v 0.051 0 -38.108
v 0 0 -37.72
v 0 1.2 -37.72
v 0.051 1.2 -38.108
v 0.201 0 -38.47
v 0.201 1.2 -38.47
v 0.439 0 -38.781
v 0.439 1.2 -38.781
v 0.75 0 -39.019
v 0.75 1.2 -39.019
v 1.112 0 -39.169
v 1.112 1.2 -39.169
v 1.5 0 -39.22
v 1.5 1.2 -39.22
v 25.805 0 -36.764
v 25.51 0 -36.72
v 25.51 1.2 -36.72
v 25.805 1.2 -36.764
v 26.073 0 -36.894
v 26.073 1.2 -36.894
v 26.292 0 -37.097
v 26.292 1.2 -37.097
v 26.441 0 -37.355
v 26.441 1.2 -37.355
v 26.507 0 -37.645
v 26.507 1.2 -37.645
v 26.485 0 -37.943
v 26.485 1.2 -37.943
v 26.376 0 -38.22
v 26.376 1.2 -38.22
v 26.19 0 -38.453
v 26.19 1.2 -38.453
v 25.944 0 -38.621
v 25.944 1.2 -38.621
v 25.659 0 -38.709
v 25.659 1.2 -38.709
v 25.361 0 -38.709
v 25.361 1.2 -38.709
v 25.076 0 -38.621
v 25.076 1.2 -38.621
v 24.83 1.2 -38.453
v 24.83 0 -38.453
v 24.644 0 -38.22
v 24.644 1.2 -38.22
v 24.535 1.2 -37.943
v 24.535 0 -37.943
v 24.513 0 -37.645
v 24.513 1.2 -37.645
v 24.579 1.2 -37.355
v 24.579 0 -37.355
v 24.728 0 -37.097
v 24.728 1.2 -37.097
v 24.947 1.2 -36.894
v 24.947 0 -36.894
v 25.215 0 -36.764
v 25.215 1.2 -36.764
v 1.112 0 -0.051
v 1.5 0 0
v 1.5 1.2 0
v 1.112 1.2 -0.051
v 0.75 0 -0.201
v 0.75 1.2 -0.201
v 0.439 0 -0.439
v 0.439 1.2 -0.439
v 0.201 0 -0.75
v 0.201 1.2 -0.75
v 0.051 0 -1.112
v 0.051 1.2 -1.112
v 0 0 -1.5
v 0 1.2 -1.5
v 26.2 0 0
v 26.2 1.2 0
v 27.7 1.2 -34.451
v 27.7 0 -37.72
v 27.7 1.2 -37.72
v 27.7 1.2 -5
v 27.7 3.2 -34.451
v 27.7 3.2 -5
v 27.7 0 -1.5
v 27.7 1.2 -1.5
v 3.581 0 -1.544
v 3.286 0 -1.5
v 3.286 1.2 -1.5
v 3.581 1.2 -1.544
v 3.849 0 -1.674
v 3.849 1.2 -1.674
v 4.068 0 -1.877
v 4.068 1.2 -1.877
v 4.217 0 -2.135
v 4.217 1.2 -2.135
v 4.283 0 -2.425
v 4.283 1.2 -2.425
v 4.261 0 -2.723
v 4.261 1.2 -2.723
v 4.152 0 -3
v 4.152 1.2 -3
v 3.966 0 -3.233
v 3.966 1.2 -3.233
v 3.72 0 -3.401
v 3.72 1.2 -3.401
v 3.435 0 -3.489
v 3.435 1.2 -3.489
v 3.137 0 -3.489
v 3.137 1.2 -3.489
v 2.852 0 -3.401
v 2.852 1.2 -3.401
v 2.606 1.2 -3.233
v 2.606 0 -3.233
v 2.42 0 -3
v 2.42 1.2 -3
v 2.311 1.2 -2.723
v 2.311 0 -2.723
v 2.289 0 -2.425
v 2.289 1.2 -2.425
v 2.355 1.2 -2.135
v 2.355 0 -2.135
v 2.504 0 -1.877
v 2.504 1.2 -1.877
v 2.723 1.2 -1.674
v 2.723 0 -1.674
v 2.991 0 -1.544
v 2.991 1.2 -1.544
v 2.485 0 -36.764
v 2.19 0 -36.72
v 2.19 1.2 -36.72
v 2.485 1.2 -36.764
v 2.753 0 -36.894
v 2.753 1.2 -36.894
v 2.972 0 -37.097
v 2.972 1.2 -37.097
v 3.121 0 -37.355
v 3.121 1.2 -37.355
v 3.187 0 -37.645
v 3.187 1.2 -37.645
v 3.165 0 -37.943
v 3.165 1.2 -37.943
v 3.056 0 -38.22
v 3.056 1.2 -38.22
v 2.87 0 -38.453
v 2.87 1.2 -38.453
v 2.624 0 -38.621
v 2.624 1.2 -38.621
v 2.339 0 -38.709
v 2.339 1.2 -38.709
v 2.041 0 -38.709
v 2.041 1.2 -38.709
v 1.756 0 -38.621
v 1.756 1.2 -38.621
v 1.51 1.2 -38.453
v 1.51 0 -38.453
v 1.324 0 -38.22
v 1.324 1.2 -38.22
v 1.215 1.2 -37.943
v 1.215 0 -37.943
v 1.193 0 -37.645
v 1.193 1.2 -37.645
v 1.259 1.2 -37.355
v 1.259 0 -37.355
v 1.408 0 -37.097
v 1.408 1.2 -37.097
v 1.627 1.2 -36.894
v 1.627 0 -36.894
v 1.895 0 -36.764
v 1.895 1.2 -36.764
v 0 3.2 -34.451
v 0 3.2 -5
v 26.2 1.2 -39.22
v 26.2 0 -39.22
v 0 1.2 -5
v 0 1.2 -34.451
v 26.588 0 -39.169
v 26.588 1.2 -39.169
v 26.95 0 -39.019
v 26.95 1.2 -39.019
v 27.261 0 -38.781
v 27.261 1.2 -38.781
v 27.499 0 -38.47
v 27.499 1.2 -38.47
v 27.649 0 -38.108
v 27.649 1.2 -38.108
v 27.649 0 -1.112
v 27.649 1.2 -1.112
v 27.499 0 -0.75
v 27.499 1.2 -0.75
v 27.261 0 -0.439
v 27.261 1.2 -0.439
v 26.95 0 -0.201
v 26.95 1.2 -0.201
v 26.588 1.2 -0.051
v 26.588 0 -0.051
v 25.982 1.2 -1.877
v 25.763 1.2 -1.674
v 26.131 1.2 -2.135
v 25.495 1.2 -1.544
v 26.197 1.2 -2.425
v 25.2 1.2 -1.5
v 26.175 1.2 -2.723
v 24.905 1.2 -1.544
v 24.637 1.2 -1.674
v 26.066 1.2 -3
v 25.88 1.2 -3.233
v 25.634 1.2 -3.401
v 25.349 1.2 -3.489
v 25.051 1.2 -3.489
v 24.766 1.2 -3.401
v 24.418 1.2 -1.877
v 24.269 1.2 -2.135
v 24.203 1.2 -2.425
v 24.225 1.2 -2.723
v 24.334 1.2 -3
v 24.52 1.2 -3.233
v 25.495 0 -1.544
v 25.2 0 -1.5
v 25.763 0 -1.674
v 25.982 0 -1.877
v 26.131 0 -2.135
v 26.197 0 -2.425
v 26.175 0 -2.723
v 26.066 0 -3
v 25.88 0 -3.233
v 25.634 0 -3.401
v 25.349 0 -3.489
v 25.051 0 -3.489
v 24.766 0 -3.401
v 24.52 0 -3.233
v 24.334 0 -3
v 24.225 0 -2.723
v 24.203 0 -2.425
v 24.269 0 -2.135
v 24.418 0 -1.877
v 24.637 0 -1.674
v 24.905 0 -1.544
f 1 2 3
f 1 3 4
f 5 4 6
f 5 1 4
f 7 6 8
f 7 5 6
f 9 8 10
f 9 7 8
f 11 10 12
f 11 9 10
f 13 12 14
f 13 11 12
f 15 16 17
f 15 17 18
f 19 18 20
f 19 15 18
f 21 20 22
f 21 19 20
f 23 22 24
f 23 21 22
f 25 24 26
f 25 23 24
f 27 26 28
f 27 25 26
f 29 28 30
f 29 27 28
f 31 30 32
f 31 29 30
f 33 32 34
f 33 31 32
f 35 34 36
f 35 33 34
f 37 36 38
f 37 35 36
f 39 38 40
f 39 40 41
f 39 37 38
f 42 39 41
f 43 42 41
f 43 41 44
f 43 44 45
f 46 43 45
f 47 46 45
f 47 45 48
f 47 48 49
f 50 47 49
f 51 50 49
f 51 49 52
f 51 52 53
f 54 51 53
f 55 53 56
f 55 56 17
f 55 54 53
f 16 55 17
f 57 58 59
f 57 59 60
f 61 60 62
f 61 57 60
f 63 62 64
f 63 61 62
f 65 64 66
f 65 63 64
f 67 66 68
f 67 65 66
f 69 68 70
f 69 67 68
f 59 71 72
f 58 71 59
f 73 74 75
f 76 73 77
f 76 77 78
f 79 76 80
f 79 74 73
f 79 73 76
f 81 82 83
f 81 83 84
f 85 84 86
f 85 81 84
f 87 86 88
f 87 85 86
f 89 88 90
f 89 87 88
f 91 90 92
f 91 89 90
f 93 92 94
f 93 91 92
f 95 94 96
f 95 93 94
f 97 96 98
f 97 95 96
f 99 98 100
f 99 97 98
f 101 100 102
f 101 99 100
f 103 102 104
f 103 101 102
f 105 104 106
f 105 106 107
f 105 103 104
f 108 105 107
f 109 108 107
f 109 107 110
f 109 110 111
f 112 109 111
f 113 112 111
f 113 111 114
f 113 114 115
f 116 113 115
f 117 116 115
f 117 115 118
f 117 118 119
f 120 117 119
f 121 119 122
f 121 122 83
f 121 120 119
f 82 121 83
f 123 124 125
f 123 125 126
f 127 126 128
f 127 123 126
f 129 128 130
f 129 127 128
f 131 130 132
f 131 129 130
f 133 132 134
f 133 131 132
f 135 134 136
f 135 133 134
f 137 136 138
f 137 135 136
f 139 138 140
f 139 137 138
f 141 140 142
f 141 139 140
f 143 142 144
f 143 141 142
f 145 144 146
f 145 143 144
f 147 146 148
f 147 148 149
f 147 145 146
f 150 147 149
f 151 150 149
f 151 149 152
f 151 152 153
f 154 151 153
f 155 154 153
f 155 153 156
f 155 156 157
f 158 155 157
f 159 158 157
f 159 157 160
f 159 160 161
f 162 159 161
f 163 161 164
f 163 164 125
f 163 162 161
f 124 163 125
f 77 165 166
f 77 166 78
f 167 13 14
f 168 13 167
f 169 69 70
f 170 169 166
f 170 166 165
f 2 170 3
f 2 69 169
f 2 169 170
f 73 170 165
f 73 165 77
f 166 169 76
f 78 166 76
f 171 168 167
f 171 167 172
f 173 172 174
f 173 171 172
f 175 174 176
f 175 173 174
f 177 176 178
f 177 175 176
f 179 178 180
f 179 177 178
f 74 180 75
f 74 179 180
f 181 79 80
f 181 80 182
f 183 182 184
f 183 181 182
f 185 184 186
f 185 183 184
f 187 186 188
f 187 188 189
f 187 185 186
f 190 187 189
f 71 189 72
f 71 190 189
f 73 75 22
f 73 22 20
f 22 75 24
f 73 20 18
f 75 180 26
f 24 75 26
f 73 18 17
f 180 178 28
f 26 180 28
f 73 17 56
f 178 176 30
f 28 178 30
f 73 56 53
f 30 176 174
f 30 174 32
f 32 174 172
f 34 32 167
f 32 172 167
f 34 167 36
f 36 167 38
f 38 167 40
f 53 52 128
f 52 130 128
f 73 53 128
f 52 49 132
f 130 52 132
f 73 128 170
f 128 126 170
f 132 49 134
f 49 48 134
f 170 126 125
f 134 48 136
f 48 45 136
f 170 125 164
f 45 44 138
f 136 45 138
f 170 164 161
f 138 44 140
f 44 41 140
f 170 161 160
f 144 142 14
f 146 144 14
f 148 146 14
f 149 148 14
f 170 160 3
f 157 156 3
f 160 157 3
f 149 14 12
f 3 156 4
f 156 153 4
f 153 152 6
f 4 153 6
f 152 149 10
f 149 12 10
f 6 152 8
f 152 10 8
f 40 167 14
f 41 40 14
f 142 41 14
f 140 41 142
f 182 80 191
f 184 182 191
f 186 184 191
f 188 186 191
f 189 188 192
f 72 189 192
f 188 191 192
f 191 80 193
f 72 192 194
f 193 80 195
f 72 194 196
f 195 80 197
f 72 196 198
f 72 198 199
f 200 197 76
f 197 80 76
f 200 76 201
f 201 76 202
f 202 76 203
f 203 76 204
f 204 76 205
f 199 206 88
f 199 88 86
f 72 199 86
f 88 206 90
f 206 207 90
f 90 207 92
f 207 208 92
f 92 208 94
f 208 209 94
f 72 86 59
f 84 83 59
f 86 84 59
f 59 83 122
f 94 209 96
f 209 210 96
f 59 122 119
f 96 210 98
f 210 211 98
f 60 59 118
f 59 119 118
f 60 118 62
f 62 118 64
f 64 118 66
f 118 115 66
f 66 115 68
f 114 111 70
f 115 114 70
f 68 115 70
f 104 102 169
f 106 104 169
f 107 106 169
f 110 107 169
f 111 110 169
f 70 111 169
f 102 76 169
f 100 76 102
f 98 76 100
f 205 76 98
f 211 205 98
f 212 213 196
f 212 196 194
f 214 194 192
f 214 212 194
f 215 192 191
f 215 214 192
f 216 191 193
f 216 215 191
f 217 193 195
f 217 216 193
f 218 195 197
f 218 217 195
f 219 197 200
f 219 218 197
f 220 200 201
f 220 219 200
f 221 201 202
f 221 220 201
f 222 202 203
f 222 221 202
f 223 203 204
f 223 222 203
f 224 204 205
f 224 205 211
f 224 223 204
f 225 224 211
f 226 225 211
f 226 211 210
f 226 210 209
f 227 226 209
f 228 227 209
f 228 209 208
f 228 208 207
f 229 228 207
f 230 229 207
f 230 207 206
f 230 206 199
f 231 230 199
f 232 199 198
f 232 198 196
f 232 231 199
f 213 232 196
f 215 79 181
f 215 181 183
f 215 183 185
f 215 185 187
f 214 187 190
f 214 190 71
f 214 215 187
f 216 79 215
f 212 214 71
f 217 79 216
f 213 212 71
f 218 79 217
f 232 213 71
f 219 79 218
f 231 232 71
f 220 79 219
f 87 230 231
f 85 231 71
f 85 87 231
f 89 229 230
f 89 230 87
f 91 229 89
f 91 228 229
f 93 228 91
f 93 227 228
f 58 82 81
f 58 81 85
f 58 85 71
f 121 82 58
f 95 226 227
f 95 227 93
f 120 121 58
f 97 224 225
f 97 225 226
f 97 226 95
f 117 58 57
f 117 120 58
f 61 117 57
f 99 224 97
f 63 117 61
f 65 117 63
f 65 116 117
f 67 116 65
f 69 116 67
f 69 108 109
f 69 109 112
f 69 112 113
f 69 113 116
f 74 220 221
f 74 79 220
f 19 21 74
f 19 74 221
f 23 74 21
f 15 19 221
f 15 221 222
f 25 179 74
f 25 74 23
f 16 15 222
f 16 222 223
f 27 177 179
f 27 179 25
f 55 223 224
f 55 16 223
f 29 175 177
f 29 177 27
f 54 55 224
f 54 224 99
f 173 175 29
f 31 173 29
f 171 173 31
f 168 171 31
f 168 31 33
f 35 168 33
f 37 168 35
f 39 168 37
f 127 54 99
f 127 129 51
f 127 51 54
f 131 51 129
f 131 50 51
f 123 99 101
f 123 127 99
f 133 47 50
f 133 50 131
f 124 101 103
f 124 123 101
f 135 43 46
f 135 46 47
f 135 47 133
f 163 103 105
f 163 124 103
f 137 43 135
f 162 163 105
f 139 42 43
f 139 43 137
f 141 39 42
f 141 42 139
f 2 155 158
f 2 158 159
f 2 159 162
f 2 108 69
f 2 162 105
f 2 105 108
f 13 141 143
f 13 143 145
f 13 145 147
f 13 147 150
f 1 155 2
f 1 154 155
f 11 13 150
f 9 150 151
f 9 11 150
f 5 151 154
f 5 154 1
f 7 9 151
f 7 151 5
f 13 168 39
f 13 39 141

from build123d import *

# Parameters (mm, degrees)
SKETCH1_R           = 1
BOSS_EXTRUDE1_DEPTH = 1.2
SKETCH2_W           = 27.7
SKETCH2_H           = 29.450740724
BOSS_EXTRUDE2_DEPTH = 2


with BuildPart() as part:
    # Sketch1 → Boss-Extrude1 (new body)
    with BuildSketch(Plane(origin=(0, 0, 0), x_dir=(1, 0, 0), z_dir=(0, 1, 0))):
        with BuildLine():
            ThreePointArc((0, 37.72), (0.439339828, 38.780660172), (1.5, 39.22))
            Line((1.5, 39.22), (26.2, 39.22))
            ThreePointArc((26.2, 39.22), (27.260660172, 38.780660172), (27.7, 37.72))
            Line((27.7, 37.72), (27.7, 1.5))
            ThreePointArc((27.7, 1.5), (27.260660172, 0.439339828), (26.2, 0))
            Line((26.2, 0), (1.5, 0))
            ThreePointArc((1.5, 0), (0.439339828, 0.439339828), (0, 1.5))
            Line((0, 1.5), (0, 37.72))
        make_face()
        with Locations(Location((25.2, 2.5, 0), (0, 0, 270))):
            Circle(SKETCH1_R, mode=Mode.SUBTRACT)
        with Locations(Location((3.286079962, 2.5, 0), (0, 0, 270))):
            Circle(SKETCH1_R, mode=Mode.SUBTRACT)
        with Locations(Location((25.51, 37.72, 0), (0, 0, 270))):
            Circle(SKETCH1_R, mode=Mode.SUBTRACT)
        with Locations(Location((2.19, 37.72, 0), (0, 0, 270))):
            Circle(SKETCH1_R, mode=Mode.SUBTRACT)
    extrude(amount=BOSS_EXTRUDE1_DEPTH)

    # Sketch2 → Boss-Extrude2 (add)
    with BuildSketch(Plane(origin=(0, 1.2, 0), x_dir=(1, 0, 0), z_dir=(0, 1, 0))):
        with Locations((13.85, 19.725370362)):
            Rectangle(SKETCH2_W, SKETCH2_H)
    extrude(amount=BOSS_EXTRUDE2_DEPTH)


solid = part.part
